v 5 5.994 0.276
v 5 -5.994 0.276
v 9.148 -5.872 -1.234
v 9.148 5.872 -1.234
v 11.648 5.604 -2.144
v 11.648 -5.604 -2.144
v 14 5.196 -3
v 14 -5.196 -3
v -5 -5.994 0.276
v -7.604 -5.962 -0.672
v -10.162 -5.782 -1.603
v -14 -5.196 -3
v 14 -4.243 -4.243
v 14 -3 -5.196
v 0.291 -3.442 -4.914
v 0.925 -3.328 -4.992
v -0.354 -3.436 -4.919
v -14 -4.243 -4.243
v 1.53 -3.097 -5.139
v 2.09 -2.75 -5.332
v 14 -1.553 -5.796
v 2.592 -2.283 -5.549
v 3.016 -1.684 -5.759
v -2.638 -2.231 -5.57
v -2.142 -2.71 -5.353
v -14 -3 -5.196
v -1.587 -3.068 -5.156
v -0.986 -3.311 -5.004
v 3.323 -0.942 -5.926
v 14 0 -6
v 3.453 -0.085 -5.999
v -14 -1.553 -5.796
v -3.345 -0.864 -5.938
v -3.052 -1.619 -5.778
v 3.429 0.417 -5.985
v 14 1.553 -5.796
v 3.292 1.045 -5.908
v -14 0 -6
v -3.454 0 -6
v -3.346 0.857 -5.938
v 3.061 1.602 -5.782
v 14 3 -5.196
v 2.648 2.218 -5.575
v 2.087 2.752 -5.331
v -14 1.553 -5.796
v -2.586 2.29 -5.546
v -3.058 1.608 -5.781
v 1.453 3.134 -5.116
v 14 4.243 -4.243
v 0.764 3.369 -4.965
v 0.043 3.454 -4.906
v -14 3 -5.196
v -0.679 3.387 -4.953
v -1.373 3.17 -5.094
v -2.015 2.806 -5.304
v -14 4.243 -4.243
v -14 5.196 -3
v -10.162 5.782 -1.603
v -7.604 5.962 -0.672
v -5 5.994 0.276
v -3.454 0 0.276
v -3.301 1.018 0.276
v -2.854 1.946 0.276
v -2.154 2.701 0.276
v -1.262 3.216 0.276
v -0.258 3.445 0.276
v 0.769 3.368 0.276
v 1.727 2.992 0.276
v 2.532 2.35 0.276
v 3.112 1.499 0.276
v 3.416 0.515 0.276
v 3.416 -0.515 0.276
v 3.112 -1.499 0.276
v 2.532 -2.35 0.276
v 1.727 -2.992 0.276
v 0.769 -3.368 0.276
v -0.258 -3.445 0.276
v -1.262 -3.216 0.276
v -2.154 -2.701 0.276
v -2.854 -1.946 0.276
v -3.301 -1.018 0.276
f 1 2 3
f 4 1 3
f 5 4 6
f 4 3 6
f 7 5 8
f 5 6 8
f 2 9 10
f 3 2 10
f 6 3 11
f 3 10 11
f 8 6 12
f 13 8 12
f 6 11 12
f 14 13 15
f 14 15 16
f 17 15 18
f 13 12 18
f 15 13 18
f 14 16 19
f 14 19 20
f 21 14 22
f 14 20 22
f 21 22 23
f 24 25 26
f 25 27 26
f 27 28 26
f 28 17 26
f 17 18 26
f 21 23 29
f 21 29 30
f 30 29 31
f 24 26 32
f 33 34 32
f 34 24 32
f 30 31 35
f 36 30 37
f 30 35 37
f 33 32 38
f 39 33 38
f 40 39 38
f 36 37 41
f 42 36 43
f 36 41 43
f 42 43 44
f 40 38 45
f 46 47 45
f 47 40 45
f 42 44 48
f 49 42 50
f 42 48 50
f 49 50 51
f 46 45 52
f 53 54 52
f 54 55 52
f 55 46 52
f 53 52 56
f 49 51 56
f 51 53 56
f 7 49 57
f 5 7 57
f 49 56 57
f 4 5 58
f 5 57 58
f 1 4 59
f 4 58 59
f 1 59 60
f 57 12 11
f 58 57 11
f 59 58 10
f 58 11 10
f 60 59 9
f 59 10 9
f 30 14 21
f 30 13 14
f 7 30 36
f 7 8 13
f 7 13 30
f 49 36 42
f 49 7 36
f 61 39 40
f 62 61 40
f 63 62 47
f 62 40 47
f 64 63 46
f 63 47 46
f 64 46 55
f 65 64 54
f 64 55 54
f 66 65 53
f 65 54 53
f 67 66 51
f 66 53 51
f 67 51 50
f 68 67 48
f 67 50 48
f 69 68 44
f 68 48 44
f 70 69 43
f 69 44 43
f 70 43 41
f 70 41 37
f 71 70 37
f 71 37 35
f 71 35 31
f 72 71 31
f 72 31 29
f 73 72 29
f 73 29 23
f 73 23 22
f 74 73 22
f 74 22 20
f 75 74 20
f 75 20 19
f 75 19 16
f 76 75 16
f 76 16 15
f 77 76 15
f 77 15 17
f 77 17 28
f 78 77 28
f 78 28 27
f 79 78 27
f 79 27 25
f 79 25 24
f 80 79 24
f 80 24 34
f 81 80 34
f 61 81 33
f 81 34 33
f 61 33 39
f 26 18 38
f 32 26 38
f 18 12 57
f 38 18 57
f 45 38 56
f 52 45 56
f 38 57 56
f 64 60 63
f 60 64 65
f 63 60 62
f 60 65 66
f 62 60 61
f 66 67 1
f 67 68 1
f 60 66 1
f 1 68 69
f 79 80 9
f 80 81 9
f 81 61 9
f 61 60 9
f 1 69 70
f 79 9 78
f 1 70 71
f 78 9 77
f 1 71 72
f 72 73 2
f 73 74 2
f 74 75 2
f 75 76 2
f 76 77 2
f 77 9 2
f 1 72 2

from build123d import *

# Parameters (mm, degrees)
EXTRUDE1_START           = -14
SKETCH1_R                = 6
EXTRUDE1_DEPTH           = 28
EXTRUDE2_DEPTH           = 20
EXTRUDE2_DEPTH_BACK      = 20
F_5_16_24_TAPPED_HOLE1_D = 6.9088


with BuildPart() as part:
    # Sketch1 → Extrude1 (new body)
    with BuildSketch(Plane(origin=(0, 0, 0), x_dir=(0, 0, -1), z_dir=(1, 0, 0)).offset(EXTRUDE1_START)):
        Circle(SKETCH1_R)
    extrude(amount=EXTRUDE1_DEPTH)

    # Sketch2 → Extrude2 (cut, two sides)
    with BuildSketch(Plane(origin=(0, 0, 0), x_dir=(1, 0, 0), z_dir=(0, 1, 0))) as extrude2_sk:
        Polygon((-5, -0.275732108), (5, -0.275732108), (14, 3), (25.458166387, 3), (25.458166387, -16.52435343), (-25.590688577, -16.52435343), (-25.590688577, 3), (-14, 3), align=None)
    extrude(amount=EXTRUDE2_DEPTH, mode=Mode.SUBTRACT)
    extrude(extrude2_sk.sketch, amount=-EXTRUDE2_DEPTH_BACK, mode=Mode.SUBTRACT)

    # 5_16-24 Tapped Hole1 (through all)
    with Locations(Plane.XY.offset(0.275732108)):
        with Locations((0, 0)):
            Hole(F_5_16_24_TAPPED_HOLE1_D / 2)


solid = part.part
